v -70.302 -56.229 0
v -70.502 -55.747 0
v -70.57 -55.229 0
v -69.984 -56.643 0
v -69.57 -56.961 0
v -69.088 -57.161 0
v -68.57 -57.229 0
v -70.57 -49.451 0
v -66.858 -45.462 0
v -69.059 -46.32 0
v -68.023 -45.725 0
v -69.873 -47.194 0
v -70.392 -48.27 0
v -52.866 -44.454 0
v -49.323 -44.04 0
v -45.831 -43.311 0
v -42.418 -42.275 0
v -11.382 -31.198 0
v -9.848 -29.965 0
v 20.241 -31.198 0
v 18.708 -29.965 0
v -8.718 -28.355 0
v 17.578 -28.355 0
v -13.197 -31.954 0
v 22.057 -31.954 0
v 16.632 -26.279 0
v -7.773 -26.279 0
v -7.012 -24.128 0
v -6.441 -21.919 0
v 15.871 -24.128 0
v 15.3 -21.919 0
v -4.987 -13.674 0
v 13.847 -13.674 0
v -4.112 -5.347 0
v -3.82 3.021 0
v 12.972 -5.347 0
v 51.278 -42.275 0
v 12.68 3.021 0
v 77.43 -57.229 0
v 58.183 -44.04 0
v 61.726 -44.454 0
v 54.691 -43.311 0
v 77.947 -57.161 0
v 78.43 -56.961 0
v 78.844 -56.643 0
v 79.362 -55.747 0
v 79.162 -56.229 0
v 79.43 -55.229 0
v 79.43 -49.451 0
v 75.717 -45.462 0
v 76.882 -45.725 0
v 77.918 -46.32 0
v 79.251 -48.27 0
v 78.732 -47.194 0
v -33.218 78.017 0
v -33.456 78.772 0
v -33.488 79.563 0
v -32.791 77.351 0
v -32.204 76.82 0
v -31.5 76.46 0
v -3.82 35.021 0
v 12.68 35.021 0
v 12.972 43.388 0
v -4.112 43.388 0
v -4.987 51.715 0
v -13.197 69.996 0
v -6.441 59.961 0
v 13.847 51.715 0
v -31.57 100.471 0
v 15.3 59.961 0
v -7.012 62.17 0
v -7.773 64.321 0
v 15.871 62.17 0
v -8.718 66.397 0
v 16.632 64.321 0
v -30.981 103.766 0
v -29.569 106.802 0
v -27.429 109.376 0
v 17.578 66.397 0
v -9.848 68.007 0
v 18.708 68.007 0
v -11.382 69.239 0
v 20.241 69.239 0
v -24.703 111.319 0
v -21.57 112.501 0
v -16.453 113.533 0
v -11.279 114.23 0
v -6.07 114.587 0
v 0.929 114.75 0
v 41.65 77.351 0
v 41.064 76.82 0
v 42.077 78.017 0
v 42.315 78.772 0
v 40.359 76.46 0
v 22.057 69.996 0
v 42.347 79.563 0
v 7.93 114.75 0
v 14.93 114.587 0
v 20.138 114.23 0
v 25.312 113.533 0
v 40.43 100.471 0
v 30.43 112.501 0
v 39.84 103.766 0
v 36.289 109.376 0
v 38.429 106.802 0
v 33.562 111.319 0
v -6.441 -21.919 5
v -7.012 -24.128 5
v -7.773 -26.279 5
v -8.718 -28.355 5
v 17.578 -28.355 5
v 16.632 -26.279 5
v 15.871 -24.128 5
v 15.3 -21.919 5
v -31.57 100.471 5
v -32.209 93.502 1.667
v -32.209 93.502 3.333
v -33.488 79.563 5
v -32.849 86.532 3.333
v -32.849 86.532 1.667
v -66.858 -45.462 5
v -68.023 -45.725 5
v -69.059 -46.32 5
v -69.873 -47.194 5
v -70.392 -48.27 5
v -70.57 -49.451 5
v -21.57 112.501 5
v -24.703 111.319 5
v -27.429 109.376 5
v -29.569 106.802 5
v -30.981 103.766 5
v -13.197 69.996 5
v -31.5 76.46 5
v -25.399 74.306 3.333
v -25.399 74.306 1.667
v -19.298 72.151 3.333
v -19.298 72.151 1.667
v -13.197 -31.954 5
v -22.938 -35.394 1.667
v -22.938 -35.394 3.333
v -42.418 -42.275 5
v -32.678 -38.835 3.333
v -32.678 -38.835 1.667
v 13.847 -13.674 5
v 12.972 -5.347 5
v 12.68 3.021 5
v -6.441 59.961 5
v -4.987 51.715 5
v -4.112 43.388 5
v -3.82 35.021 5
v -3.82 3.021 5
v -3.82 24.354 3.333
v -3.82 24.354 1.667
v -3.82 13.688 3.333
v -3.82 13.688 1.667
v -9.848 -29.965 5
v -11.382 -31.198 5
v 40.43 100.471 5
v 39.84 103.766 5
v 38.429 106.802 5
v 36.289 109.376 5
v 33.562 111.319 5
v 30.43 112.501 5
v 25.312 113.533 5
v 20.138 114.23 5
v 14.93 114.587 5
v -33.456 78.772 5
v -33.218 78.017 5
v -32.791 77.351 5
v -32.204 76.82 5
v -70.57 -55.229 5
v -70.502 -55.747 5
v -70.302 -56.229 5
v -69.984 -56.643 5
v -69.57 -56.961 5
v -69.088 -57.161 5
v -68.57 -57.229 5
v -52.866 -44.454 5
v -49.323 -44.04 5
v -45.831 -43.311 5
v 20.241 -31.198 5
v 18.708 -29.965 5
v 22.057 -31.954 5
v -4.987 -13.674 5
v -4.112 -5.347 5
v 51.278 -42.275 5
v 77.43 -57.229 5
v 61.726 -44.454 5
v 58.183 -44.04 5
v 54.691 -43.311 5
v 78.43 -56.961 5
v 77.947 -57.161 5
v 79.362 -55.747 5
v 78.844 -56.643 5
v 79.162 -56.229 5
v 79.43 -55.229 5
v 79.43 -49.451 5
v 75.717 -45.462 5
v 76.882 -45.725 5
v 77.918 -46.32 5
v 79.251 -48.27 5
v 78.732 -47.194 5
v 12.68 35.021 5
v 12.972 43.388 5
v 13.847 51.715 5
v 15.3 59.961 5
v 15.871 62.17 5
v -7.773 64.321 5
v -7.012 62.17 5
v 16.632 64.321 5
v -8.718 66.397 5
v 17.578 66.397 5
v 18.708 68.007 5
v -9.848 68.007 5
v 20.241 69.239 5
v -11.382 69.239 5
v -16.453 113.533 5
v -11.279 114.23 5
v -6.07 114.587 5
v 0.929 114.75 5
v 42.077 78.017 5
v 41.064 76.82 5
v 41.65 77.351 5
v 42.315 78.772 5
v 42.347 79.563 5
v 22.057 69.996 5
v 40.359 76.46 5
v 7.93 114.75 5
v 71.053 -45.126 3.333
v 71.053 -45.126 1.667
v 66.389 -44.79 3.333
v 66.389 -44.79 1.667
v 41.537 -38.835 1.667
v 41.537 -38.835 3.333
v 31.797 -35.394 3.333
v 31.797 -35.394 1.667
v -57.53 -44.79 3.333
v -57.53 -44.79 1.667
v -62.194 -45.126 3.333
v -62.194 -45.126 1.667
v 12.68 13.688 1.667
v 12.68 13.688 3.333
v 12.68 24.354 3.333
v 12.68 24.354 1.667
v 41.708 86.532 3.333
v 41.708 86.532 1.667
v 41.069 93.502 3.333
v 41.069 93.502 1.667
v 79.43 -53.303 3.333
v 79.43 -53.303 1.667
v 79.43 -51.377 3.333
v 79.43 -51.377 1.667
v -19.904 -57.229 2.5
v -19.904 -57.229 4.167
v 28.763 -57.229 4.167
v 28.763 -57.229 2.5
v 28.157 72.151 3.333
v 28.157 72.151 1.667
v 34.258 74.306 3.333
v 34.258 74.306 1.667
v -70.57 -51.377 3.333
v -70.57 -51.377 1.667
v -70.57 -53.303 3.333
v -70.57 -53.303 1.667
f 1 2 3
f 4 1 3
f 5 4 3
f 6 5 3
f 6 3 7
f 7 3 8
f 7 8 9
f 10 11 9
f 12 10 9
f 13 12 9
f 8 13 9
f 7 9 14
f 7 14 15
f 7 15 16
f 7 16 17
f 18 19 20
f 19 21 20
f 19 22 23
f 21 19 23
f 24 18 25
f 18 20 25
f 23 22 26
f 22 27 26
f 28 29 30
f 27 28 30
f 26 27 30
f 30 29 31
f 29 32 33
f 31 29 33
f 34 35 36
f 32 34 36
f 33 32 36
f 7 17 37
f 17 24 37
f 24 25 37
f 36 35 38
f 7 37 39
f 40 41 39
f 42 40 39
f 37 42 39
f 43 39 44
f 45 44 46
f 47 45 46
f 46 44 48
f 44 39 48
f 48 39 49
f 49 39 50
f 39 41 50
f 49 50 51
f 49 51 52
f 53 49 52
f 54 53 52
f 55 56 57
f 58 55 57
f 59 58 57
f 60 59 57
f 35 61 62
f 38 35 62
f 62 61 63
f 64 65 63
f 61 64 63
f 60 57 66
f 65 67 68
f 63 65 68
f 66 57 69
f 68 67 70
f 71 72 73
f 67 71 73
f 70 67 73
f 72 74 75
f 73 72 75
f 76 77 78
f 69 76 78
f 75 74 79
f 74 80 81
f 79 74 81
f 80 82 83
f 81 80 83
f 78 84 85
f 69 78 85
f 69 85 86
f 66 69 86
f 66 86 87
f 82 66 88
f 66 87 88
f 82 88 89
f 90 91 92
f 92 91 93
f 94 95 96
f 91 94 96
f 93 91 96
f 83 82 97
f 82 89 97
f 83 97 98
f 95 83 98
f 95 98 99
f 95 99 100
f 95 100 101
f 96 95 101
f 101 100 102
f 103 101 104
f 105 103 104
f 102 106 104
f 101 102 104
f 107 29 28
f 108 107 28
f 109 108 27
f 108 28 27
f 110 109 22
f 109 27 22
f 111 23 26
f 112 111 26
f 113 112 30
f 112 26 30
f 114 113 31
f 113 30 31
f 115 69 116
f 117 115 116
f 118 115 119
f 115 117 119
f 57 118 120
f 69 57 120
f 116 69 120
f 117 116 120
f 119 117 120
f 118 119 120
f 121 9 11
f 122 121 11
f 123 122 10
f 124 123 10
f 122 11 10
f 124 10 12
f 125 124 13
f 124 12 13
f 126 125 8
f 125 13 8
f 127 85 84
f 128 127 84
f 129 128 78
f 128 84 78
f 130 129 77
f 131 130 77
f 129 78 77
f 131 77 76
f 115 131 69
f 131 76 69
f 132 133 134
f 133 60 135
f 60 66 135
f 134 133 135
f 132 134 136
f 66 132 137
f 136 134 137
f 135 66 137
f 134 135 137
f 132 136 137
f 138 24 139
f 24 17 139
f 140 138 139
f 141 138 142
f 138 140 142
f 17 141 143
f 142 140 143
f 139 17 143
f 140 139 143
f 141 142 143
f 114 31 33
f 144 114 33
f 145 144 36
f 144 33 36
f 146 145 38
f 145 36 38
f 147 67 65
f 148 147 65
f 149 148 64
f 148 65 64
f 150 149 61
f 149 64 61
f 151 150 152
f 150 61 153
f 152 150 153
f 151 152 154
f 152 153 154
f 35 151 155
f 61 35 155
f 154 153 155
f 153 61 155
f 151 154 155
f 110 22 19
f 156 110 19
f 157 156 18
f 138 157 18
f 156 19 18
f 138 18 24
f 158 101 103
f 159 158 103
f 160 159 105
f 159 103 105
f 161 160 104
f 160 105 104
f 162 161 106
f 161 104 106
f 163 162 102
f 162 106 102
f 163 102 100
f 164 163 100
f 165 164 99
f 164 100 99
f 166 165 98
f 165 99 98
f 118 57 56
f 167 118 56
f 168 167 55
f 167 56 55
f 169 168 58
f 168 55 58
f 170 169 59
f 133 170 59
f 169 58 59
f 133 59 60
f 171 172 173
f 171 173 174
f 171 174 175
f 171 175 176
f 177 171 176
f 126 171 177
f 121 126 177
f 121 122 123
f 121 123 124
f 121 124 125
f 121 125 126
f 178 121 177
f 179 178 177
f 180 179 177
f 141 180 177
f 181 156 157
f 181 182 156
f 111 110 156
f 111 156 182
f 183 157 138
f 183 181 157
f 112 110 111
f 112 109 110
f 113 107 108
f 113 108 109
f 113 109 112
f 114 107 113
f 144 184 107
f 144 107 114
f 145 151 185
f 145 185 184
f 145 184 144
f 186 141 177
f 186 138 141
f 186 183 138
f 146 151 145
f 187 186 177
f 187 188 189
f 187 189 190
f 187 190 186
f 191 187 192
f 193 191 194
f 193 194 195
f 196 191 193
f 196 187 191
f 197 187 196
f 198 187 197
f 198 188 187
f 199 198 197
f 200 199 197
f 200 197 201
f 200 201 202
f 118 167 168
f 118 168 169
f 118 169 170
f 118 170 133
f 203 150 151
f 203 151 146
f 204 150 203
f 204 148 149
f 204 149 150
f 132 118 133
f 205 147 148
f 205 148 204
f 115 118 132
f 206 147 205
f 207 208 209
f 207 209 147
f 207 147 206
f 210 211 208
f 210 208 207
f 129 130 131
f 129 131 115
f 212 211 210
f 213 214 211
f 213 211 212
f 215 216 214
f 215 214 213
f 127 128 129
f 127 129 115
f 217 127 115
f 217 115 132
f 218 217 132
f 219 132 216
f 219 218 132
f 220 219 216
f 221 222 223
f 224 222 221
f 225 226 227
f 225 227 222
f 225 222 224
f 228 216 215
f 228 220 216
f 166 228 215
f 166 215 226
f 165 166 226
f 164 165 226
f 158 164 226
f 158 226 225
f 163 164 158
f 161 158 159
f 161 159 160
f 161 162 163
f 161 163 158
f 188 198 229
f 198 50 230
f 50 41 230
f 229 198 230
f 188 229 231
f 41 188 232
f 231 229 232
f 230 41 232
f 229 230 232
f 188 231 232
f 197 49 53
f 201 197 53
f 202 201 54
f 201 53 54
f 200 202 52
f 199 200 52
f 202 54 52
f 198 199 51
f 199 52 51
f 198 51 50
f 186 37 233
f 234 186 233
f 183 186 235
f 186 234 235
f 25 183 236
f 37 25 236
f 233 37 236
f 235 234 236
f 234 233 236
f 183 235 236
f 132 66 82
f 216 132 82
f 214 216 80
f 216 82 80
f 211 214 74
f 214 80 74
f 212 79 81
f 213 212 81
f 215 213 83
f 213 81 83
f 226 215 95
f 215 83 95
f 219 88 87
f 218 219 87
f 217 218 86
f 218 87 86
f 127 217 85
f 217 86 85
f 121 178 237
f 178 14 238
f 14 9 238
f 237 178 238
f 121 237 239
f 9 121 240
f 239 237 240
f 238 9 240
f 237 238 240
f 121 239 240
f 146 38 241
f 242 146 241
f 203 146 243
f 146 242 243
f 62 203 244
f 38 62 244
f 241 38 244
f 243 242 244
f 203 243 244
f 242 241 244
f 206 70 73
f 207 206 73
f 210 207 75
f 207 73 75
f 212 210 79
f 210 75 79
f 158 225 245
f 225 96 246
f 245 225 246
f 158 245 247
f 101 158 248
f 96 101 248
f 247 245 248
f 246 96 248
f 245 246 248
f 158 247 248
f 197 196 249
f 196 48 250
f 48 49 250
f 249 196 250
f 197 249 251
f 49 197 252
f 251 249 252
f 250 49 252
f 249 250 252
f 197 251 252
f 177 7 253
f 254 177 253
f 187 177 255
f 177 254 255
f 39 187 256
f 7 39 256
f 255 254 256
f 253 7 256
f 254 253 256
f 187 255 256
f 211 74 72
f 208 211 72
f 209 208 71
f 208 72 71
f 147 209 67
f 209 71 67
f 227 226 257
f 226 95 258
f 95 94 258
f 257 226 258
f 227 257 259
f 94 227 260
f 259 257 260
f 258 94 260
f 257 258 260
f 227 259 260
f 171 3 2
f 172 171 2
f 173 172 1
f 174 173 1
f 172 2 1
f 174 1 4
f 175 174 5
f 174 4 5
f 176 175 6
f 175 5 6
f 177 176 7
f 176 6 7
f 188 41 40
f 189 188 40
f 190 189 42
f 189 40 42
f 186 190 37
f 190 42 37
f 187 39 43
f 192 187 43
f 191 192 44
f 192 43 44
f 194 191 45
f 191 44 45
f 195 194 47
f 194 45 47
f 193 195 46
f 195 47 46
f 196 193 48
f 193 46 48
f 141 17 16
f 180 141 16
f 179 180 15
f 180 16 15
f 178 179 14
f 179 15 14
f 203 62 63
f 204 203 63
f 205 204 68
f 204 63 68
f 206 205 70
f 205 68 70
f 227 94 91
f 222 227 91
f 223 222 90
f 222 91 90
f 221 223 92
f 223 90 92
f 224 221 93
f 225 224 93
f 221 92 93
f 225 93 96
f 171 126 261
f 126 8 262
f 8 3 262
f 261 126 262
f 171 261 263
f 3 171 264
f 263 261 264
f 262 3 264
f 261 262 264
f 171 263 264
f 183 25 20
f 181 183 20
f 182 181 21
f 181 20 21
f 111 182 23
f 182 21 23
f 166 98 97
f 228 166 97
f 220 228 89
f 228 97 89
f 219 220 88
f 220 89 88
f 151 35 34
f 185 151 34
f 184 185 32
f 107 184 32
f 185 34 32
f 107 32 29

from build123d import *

# Parameters (mm, degrees)
F1_DEPTH = 5


with BuildPart() as f1:
    # F0 (on Top) → F1 (new body)
    with BuildSketch(Plane.XY):
        with BuildLine():
            add(Edge.make_bspline(
                [(42.347362, 79.562907), (42.134291, 81.886016), (41.708148, 86.532233), (41.068935, 93.501559), (40.642792, 98.147776), (40.429721, 100.470884)],
                knots=[0, 0, 0, 0, 6.998578, 13.997156, 20.995734, 20.995734, 20.995734, 20.995734], degree=3))
            ThreePointArc((40.429721, 100.470884), (37.441749, 108.15842), (30.429721, 112.50096))
            ThreePointArc((30.429721, 112.50096), (22.730822, 113.923703), (14.929721, 114.587078))
            ThreePointArc((14.929721, 114.587078), (4.429721, 114.770884), (-6.070279, 114.587078))
            ThreePointArc((-6.070279, 114.587078), (-13.87138, 113.923703), (-21.570279, 112.50096))
            ThreePointArc((-21.570279, 112.50096), (-28.582306, 108.15842), (-31.570279, 100.470884))
            add(Edge.make_bspline(
                [(-31.570279, 100.470884), (-31.78335, 98.147776), (-32.209492, 93.501559), (-32.848706, 86.532233), (-33.274848, 81.886016), (-33.487919, 79.562907)],
                knots=[0, 0, 0, 0, 6.998578, 13.997156, 20.995734, 20.995734, 20.995734, 20.995734], degree=3))
            ThreePointArc((-33.487919, 79.562907), (-33.026295, 77.670215), (-31.499503, 76.460138))
            add(Edge.make_bspline(
                [(-31.499503, 76.460138), (-29.46591, 75.741927), (-25.398724, 74.305504), (-19.297945, 72.15087), (-15.230758, 70.714447), (-13.197165, 69.996235)],
                knots=[0, 0, 0, 0, 6.470082, 12.940164, 19.410245, 19.410245, 19.410245, 19.410245], degree=3))
            ThreePointArc((-13.197165, 69.996235), (-10.571416, 68.677315), (-8.718314, 66.396937))
            ThreePointArc((-8.718314, 66.396937), (-7.368697, 63.253483), (-6.440564, 59.960864))
            ThreePointArc((-6.440564, 59.960864), (-4.477148, 47.55951), (-3.820279, 35.020884))
            add(Edge.make_bspline(
                [(-3.820279, 35.020884), (-3.820279, 31.465329), (-3.820279, 24.354218), (-3.820279, 13.687551), (-3.820279, 6.57644), (-3.820279, 3.020884)],
                knots=[0, 0, 0, 0, 10.666667, 21.333333, 32, 32, 32, 32], degree=3))
            ThreePointArc((-3.820279, 3.020884), (-4.477148, -9.517741), (-6.440564, -21.919096))
            ThreePointArc((-6.440564, -21.919096), (-7.368697, -25.211715), (-8.718314, -28.355168))
            ThreePointArc((-8.718314, -28.355168), (-10.571416, -30.635546), (-13.197165, -31.954467))
            add(Edge.make_bspline(
                [(-13.197165, -31.954467), (-16.443947, -33.101144), (-22.93751, -35.394499), (-32.677854, -38.834532), (-39.171417, -41.127887), (-42.418199, -42.274564)],
                knots=[0, 0, 0, 0, 10.329963, 20.659926, 30.989889, 30.989889, 30.989889, 30.989889], degree=3))
            ThreePointArc((-42.418199, -42.274564), (-47.569185, -43.714534), (-52.866234, -44.454425))
            add(Edge.make_bspline(
                [(-52.866234, -44.454425), (-54.420823, -44.566355), (-57.530001, -44.790216), (-62.193768, -45.126007), (-65.302946, -45.349868), (-66.857535, -45.461798)],
                knots=[0, 0, 0, 0, 4.67584, 9.35168, 14.027519, 14.027519, 14.027519, 14.027519], degree=3))
            ThreePointArc((-66.857535, -45.461798), (-69.498506, -46.726496), (-70.570279, -49.45147))
            add(Edge.make_bspline(
                [(-70.570279, -49.45147), (-70.570279, -50.093431), (-70.570279, -51.377352), (-70.570279, -53.303234), (-70.570279, -54.587155), (-70.570279, -55.229116)],
                knots=[0, 0, 0, 0, 1.925882, 3.851764, 5.777645, 5.777645, 5.777645, 5.777645], degree=3))
            ThreePointArc((-70.570279, -55.229116), (-69.984492, -56.643329), (-68.570279, -57.229116))
            add(Edge.make_bspline(
                [(-68.570279, -57.229116), (-60.459168, -57.229116), (-44.236945, -57.229116), (-19.903612, -57.229116), (-3.68139, -57.229116), (4.429721, -57.229116)],
                knots=[0, 0, 0, 0, 24.333333, 48.666667, 73, 73, 73, 73], degree=3))
            add(Edge.make_bspline(
                [(4.429721, -57.229116), (12.540832, -57.229116), (28.763055, -57.229116), (53.096388, -57.229116), (69.31861, -57.229116), (77.429721, -57.229116)],
                knots=[0, 0, 0, 0, 24.333333, 48.666667, 73, 73, 73, 73], degree=3))
            ThreePointArc((77.429721, -57.229116), (78.843935, -56.643329), (79.429721, -55.229116))
            add(Edge.make_bspline(
                [(79.429721, -55.229116), (79.429721, -54.587155), (79.429721, -53.303234), (79.429721, -51.377352), (79.429721, -50.093431), (79.429721, -49.45147)],
                knots=[0, 0, 0, 0, 1.925882, 3.851764, 5.777645, 5.777645, 5.777645, 5.777645], degree=3))
            ThreePointArc((79.429721, -49.45147), (78.357948, -46.726496), (75.716978, -45.461798))
            add(Edge.make_bspline(
                [(75.716978, -45.461798), (74.162389, -45.349868), (71.053211, -45.126007), (66.389444, -44.790216), (63.280266, -44.566355), (61.725677, -44.454425)],
                knots=[0, 0, 0, 0, 4.67584, 9.35168, 14.027519, 14.027519, 14.027519, 14.027519], degree=3))
            ThreePointArc((61.725677, -44.454425), (56.428627, -43.714534), (51.277641, -42.274564))
            add(Edge.make_bspline(
                [(51.277641, -42.274564), (48.03086, -41.127887), (41.537297, -38.834532), (31.796952, -35.394499), (25.303389, -33.101144), (22.056608, -31.954467)],
                knots=[0, 0, 0, 0, 10.329963, 20.659926, 30.989889, 30.989889, 30.989889, 30.989889], degree=3))
            ThreePointArc((22.056608, -31.954467), (19.430859, -30.635546), (17.577757, -28.355168))
            ThreePointArc((17.577757, -28.355168), (16.228139, -25.211715), (15.300007, -21.919096))
            ThreePointArc((15.300007, -21.919096), (13.33659, -9.517741), (12.679721, 3.020884))
            add(Edge.make_bspline(
                [(12.679721, 3.020884), (12.679721, 6.57644), (12.679721, 13.687551), (12.679721, 24.354218), (12.679721, 31.465329), (12.679721, 35.020884)],
                knots=[0, 0, 0, 0, 10.666667, 21.333333, 32, 32, 32, 32], degree=3))
            ThreePointArc((12.679721, 35.020884), (13.33659, 47.55951), (15.300007, 59.960864))
            ThreePointArc((15.300007, 59.960864), (16.228139, 63.253483), (17.577757, 66.396937))
            ThreePointArc((17.577757, 66.396937), (19.430859, 68.677315), (22.056608, 69.996235))
            add(Edge.make_bspline(
                [(22.056608, 69.996235), (24.090201, 70.714447), (28.157387, 72.15087), (34.258167, 74.305504), (38.325353, 75.741927), (40.358946, 76.460138)],
                knots=[0, 0, 0, 0, 6.470082, 12.940164, 19.410245, 19.410245, 19.410245, 19.410245], degree=3))
            ThreePointArc((40.358946, 76.460138), (41.885738, 77.670215), (42.347362, 79.562907))
        make_face()
    extrude(amount=F1_DEPTH)


solid = f1.part
